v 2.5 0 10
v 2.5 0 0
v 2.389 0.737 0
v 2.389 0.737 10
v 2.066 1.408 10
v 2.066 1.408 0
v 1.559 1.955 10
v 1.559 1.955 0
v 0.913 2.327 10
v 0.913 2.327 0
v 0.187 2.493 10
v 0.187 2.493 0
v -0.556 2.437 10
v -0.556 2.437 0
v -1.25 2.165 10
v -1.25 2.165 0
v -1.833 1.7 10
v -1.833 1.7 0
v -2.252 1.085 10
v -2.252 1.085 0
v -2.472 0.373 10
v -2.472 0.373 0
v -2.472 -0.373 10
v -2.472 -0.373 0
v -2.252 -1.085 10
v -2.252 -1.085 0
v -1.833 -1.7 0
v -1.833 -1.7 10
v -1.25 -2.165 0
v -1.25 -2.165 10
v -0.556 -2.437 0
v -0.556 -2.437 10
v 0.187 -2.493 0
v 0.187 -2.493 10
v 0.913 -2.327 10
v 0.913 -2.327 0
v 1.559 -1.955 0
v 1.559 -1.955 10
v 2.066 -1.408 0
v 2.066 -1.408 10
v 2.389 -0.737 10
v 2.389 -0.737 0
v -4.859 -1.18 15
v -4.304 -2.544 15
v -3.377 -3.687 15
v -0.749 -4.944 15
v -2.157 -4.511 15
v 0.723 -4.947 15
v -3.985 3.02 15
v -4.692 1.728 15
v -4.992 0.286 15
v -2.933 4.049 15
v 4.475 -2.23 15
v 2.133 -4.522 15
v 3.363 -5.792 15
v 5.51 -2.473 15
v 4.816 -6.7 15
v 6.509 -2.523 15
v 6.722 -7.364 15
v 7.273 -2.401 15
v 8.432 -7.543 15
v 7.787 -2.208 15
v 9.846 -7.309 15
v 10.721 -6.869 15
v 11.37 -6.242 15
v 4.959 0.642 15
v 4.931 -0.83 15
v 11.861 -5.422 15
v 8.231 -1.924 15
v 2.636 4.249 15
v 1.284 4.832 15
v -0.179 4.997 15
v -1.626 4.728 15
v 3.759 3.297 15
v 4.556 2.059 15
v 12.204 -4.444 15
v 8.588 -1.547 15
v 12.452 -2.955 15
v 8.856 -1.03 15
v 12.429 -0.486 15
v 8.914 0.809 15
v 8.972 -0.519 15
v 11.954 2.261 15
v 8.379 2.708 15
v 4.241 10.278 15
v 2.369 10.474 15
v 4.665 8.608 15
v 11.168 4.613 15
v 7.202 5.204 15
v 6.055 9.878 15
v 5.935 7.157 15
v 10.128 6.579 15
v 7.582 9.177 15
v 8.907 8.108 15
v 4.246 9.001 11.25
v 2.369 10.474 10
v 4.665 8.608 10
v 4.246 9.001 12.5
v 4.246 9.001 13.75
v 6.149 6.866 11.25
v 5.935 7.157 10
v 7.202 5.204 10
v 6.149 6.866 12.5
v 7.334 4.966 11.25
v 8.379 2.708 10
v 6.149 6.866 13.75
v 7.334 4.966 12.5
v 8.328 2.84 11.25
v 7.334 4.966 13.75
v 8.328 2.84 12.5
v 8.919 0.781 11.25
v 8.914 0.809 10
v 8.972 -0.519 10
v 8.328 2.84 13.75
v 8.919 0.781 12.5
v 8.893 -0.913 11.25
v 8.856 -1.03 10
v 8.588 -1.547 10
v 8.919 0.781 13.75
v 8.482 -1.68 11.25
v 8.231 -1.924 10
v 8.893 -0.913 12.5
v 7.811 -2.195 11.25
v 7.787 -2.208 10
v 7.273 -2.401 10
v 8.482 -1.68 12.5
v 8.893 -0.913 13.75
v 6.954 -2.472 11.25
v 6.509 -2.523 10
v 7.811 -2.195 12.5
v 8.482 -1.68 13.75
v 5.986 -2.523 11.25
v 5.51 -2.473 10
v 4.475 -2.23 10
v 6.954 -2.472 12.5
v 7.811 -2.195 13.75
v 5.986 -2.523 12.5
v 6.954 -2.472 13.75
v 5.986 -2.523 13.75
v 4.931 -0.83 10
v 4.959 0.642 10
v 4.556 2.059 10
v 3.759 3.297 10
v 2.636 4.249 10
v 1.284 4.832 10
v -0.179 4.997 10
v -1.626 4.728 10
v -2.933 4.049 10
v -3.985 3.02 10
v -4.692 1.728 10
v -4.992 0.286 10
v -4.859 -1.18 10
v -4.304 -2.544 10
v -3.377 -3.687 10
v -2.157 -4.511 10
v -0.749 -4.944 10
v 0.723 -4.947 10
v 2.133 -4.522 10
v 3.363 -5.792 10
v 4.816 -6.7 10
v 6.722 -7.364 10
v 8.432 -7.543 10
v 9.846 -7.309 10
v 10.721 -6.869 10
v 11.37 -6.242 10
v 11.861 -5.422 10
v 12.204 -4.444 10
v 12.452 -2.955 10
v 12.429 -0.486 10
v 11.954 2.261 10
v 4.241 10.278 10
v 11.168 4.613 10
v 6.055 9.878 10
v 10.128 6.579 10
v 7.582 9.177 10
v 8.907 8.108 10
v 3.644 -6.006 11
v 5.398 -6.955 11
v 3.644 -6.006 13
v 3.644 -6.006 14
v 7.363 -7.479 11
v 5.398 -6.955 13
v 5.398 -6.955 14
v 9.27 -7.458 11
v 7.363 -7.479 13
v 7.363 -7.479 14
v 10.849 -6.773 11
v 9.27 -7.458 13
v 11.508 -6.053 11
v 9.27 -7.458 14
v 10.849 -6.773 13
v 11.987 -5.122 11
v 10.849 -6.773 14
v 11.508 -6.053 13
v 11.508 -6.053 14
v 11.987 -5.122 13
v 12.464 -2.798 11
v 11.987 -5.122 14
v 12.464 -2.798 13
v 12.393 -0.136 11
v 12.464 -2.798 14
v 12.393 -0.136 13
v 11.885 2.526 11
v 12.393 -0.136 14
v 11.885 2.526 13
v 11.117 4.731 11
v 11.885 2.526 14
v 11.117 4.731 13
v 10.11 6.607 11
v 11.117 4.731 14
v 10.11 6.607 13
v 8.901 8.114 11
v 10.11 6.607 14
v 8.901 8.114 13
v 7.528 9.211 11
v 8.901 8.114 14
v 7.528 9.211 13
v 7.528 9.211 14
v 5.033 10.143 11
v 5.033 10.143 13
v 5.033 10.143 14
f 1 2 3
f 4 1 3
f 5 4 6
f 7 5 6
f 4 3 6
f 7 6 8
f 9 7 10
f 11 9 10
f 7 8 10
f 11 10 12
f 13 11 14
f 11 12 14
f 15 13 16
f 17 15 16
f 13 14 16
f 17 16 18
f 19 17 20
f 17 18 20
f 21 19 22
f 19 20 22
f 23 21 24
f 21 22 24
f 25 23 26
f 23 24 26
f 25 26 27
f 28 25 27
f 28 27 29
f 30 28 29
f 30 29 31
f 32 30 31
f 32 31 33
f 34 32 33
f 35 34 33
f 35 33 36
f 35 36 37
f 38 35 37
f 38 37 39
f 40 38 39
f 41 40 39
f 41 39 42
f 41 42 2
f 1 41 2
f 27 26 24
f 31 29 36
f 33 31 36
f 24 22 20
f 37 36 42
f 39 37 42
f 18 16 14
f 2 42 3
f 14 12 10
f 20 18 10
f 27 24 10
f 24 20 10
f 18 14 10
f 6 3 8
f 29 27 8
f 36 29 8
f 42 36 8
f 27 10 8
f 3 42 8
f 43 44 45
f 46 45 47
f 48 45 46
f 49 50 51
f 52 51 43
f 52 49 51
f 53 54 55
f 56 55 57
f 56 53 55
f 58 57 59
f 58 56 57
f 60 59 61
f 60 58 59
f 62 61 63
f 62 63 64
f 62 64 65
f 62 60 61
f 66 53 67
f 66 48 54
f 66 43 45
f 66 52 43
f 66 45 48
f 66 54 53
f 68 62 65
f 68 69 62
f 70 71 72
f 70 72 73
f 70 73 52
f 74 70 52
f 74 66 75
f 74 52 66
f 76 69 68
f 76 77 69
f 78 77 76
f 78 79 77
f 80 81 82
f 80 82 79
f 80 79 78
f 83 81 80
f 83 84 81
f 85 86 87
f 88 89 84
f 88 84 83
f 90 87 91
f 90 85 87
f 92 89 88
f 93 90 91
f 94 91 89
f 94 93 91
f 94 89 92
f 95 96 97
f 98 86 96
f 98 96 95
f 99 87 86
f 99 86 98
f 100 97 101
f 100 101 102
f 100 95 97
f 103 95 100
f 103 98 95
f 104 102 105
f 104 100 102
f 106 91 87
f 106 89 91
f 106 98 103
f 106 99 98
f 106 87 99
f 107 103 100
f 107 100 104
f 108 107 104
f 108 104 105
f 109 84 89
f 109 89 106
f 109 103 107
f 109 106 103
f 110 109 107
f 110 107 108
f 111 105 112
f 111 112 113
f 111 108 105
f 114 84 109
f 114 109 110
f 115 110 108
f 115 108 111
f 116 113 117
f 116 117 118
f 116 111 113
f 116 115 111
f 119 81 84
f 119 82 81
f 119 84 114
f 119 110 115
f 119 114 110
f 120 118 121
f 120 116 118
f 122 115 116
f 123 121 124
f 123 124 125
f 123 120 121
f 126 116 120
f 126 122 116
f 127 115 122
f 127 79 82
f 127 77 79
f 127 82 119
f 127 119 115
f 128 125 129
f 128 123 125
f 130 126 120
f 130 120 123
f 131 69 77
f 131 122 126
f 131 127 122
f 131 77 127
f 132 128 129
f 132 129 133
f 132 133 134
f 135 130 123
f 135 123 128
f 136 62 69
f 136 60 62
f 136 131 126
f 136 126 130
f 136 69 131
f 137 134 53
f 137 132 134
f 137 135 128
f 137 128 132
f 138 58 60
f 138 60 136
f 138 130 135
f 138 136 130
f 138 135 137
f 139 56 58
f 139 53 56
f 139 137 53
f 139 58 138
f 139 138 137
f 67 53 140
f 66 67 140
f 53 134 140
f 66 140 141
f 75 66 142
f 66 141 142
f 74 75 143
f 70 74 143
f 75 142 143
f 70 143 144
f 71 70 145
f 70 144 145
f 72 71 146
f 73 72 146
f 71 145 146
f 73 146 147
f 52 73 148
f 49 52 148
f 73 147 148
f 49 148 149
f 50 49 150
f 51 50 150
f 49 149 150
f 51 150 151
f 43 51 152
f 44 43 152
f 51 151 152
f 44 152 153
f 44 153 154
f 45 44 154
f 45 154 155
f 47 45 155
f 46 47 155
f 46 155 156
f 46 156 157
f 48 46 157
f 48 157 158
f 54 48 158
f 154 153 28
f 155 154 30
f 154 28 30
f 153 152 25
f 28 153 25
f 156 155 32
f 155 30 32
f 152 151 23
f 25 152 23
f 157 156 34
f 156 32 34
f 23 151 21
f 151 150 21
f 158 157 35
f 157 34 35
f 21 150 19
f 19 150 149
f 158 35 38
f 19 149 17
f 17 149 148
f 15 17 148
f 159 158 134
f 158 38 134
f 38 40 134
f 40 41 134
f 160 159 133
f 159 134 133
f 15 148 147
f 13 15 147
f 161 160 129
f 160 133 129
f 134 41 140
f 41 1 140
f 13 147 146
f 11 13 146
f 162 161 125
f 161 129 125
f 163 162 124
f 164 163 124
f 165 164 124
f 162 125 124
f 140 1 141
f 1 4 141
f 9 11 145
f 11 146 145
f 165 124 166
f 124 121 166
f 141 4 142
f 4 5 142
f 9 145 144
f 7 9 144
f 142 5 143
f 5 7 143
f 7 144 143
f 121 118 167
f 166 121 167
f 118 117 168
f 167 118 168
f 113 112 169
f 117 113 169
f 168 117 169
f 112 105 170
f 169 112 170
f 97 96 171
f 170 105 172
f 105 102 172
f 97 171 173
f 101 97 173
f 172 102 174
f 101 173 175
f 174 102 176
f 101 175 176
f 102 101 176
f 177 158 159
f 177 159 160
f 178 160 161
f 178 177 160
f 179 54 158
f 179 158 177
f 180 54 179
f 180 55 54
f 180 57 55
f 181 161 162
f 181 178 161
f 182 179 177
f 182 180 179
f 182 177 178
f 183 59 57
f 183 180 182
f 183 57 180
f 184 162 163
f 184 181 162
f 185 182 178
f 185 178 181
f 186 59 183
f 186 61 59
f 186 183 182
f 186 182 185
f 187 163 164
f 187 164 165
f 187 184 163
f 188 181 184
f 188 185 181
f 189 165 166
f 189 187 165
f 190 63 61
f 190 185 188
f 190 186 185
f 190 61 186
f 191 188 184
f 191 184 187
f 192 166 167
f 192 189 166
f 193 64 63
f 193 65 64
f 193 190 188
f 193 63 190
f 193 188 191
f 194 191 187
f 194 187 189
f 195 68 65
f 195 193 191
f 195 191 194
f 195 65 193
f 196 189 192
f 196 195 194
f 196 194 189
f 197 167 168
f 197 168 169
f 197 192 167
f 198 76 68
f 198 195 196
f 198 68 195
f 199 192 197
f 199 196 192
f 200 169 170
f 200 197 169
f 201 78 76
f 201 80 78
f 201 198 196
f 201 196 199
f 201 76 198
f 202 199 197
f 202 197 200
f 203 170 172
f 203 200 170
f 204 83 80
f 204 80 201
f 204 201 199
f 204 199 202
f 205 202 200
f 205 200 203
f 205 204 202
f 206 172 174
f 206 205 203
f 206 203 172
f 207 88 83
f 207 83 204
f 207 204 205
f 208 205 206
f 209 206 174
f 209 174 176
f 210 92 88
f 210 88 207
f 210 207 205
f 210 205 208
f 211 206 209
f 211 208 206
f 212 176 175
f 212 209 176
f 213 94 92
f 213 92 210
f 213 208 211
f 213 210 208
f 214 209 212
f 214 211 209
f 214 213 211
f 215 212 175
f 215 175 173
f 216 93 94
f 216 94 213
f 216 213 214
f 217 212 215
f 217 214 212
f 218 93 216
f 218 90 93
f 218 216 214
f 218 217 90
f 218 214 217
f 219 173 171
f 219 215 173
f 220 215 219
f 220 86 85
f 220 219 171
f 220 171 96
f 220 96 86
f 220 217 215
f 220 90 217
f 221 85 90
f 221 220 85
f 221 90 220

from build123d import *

# Parameters (mm, degrees)
F0_R     = 2.5
F1_DEPTH = 10
F2_R     = 5
F3_DEPTH = 5
F5_DEPTH = 5


with BuildPart() as f1:
    # F0 (on Top) → F1 (new body)
    with BuildSketch(Plane.XY):
        Circle(F0_R)
    extrude(amount=F1_DEPTH)

    # F2 (on face) → F3 (join)
    with BuildSketch(Plane.XY.offset(10)):
        Circle(F2_R)
    extrude(amount=F3_DEPTH)

    # F4 (on face) → F5 (join)
    with BuildSketch(Plane.XY.offset(15)):
        with BuildLine():
            add(Edge.make_bspline(
                [(2.3691724055, 10.4739163071), (3.6171175016, 9.5655306773), (6.4330903003, 7.5157696483), (10.4923916121, -1.3404631343), (5.5962643477, -3.2815315567), (2.0610451119, -1.2085534482), (0, 0)],
                knots=[0, 0, 0, 0, 0.2398684051, 0.5412601132, 0.7325530503, 1, 1, 1, 1], degree=3))
            add(Edge.make_bspline(
                [(0, 0), (0.7995101405, -2.2661683994), (2.4109855504, -6.8338085894), (12.9029598213, -8.9536947786), (12.7542446079, 3.0952083907), (8.1577313992, 9.9773043244), (4.1636412668, 10.3199652564), (2.3691724055, 10.4739163071)],
                knots=[0, 0, 0, 0, 0.1958907079, 0.3948330895, 0.6209051234, 0.8296798698, 1, 1, 1, 1], degree=3))
        make_face()
    extrude(amount=-F5_DEPTH)


solid = f1.part
